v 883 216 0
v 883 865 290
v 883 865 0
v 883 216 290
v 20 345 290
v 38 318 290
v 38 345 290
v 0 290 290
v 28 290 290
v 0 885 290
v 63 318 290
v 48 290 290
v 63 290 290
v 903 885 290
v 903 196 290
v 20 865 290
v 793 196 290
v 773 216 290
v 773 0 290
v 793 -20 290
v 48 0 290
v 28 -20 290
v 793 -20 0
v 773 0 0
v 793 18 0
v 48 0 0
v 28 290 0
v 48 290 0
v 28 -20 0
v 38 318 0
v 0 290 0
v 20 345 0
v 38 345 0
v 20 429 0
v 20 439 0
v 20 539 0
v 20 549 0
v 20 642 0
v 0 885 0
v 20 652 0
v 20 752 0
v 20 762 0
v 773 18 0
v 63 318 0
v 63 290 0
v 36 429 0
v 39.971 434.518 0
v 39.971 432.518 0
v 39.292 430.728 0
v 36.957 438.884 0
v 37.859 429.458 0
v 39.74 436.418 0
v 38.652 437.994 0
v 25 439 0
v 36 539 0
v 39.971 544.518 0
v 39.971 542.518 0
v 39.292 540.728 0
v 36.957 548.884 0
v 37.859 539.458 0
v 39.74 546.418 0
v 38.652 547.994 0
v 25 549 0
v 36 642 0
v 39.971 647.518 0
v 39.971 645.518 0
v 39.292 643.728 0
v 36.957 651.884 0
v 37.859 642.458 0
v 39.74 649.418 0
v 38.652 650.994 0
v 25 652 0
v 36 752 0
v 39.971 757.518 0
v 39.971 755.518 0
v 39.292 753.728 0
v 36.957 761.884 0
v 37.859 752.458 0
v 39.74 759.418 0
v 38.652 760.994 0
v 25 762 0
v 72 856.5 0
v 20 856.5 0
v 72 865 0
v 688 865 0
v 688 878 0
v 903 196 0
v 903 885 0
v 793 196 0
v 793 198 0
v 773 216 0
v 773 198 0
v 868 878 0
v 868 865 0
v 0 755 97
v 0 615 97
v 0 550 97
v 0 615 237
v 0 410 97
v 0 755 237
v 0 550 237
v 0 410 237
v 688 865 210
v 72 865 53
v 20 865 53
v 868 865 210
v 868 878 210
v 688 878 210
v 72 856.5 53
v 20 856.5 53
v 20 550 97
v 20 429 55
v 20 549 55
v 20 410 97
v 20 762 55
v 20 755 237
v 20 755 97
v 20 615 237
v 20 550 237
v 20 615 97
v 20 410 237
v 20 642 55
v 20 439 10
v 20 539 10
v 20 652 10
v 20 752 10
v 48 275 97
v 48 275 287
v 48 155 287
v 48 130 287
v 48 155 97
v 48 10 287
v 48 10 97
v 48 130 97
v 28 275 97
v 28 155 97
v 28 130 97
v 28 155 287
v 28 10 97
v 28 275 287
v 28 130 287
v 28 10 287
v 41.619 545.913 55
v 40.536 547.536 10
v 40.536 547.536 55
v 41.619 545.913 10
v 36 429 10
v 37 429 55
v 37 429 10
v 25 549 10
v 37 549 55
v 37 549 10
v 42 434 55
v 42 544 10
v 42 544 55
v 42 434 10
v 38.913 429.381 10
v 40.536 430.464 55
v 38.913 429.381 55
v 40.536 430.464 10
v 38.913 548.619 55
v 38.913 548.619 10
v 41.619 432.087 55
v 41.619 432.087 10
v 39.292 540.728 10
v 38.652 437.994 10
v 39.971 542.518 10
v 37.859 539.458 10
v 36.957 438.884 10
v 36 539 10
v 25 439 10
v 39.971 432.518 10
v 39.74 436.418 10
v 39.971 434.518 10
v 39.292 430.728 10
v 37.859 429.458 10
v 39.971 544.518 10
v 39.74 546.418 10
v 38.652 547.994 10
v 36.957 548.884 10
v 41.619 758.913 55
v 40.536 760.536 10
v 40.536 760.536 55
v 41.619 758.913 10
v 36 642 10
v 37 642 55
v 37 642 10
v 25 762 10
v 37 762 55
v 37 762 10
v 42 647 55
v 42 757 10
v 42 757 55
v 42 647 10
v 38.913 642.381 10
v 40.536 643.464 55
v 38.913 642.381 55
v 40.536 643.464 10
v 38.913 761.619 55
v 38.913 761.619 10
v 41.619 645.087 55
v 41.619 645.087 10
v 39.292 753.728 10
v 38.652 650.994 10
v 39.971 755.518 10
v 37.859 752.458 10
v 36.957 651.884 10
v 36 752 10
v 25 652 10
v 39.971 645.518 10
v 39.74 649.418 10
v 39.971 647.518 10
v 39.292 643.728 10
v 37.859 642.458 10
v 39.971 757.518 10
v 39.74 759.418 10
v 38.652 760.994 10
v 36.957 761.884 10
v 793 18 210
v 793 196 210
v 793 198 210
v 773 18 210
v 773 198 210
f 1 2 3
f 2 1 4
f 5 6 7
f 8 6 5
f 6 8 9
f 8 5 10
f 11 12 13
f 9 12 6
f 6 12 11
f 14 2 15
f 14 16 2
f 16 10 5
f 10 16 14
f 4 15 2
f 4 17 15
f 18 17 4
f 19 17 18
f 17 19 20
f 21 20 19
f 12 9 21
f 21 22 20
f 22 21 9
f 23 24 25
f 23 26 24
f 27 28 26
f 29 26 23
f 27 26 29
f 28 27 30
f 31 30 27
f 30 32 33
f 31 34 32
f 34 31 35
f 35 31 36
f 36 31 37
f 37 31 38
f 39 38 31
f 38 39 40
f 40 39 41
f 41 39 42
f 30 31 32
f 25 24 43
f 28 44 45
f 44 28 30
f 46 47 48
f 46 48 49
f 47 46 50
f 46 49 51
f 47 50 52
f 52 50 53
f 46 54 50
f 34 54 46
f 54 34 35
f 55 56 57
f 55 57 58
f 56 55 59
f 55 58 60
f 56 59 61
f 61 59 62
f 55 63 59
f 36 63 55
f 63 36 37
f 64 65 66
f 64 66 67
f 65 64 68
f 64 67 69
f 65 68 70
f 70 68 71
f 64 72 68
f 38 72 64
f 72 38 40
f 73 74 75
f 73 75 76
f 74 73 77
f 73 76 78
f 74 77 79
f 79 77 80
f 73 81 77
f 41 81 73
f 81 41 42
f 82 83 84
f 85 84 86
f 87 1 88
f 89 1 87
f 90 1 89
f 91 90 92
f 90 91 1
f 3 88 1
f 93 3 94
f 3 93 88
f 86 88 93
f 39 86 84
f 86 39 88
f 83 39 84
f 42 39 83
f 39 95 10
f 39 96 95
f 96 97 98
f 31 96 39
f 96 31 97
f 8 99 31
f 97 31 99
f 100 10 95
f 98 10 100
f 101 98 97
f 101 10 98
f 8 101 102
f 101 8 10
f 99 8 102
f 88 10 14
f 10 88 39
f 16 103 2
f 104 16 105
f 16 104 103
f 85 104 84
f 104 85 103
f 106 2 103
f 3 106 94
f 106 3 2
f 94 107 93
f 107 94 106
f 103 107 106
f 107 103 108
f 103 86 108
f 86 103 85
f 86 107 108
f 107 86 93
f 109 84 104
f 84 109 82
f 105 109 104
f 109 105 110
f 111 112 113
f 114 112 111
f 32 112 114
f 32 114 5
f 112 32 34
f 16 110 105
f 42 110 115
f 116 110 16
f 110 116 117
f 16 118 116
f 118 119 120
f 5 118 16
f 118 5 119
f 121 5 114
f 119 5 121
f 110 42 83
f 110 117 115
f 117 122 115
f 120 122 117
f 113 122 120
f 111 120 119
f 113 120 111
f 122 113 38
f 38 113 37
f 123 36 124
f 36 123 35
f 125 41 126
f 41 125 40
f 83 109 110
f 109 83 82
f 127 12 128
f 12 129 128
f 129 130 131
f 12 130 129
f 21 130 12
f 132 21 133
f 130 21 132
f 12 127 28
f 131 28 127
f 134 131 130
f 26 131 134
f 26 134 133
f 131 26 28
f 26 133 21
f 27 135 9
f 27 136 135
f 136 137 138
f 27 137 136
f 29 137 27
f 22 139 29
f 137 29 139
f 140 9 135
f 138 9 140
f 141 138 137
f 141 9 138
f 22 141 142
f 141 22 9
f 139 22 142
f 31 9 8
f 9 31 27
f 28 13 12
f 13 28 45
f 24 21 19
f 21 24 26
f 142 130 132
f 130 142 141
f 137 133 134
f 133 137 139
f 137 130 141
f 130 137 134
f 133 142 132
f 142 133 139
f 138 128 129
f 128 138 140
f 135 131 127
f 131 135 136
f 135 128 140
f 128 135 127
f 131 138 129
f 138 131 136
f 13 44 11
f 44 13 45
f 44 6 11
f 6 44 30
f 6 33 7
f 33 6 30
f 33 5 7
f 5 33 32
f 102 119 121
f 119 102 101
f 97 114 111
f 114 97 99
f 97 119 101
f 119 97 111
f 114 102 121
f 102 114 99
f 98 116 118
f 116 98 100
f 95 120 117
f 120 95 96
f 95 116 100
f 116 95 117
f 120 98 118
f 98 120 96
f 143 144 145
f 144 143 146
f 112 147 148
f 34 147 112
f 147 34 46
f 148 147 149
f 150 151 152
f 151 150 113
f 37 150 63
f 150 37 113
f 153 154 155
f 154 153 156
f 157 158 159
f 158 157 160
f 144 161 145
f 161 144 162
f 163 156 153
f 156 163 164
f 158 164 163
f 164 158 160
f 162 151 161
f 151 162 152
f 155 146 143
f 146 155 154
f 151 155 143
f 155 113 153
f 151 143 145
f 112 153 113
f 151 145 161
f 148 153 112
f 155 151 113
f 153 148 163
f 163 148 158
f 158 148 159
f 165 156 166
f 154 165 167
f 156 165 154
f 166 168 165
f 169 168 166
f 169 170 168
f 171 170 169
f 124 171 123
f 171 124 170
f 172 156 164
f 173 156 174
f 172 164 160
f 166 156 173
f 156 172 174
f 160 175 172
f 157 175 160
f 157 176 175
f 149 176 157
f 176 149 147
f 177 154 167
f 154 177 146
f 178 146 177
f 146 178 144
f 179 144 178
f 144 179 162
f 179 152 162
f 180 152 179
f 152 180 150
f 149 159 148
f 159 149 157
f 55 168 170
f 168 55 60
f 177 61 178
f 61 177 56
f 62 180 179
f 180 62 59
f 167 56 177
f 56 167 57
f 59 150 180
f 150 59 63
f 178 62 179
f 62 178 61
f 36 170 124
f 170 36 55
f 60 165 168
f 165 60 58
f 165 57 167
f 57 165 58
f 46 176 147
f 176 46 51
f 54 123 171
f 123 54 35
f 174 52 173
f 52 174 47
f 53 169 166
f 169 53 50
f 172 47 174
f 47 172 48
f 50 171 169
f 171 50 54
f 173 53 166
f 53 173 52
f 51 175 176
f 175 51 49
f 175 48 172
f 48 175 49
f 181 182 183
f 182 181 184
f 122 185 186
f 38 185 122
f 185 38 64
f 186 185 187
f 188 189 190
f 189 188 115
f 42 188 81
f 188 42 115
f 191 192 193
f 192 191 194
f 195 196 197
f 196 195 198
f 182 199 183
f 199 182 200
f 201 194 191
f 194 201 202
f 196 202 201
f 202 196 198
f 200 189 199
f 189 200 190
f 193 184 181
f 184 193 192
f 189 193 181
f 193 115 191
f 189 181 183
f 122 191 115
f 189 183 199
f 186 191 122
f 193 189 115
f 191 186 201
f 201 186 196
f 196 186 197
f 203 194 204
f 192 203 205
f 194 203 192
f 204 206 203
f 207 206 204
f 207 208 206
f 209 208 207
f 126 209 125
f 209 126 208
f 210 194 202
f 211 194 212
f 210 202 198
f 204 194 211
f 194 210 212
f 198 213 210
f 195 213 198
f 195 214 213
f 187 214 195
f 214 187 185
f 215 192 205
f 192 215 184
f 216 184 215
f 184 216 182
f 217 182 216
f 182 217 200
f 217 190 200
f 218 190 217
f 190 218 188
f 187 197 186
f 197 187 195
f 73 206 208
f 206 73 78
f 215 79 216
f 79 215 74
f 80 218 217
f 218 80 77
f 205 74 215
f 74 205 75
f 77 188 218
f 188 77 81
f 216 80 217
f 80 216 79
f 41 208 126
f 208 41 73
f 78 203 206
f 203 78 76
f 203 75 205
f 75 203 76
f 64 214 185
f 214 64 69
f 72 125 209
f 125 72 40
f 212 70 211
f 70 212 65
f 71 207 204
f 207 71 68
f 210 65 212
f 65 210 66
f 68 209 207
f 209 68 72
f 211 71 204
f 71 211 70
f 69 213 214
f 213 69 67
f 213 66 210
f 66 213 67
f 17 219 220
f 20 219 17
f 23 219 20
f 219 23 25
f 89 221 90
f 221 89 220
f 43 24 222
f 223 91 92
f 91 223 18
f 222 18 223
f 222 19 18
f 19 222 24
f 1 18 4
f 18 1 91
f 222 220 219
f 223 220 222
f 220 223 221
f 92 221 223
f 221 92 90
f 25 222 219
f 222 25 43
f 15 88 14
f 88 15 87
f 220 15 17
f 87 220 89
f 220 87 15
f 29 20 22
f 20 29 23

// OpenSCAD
module tavolo_1(){
    union(){
        // pianale 140x80x3
        translate([0,0,69]) cube([140, 80, 3]);
        
        // gamba 1
        translate([11,11,0])
            rotate(a=90, v=[0,0,1]) 
                cylinder($fn=3, r=7, h=69);
        // gamba 2
        translate([129,11,0])
            rotate(a=90, v=[0,0,1]) 
                cylinder($fn=3, r=7, h=69);
        
        // gamba 3
        translate([11,69,0])
            rotate(a=-90, v=[0,0,1]) 
                cylinder($fn=3, r=7, h=69);
        // gamba 4
        translate([129,69,0])
            rotate(a=-90, v=[0,0,1]) 
                cylinder($fn=3, r=7, h=69);
    }
}

module tavolo_2(){
    
    module gamba_tavolo_2(){
        rotate(a=90, v=[0,0,1])
            union(){
                translate([1,0,0]) cube([78,8,3]);
                translate([35, 0, 0]) cube([8,8,74]);
            }
    }
    
    union(){
        // pianale 120x80x3
        translate([0,0,74]) cube([120, 80, 3]);
        
        // gamba 1
        translate([8,0,0]) gamba_tavolo_2();
        
        // gamba 2
        translate([120,0,0]) gamba_tavolo_2();
    
    }
}

module audio(){
    union(){
        translate([0,0,7]) cube([53,43,85]);
        
        translate([3.5,3.5,3.5]) sphere(r=3.5, $fn=50);
        translate([49.5,3.5,3.5]) sphere(r=3.5, $fn=50);
        translate([3.5,39.5,3.5]) sphere(r=3.5, $fn=50);
        translate([49.5,39.5,3.5]) sphere(r=3.5, $fn=50);
    }
}

module armadio(){
    module maniglia(){
        difference(){
            cube([2,5,10]);
            translate([0,2,2]) cube([3,3,6]);
        }
    }
    union(){
        cube([95,46,84]);
        translate([42,-5,68]) maniglia();
        translate([53,-5,68]) maniglia();
    }
}

module lucidi() {
    union(){
        translate([0,0,50]) cube([45,40,3]);
        cube([2,2,77]);
        translate([43,0,0]) cube([2,2,77]);
        translate([0,38,0]) cube([2,2,77]);
        translate([43,38,0]) cube([2,2,77]);
        translate([0,0,75]) cube([2,40,2]);
        translate([43,0,75]) cube([2,40,2]);
    }
}


module pareti() {
    
    module parete_sud(){
        // todo aggiungi termoconvettori
        module colonna(){
            union(){
                cube([63, 28,290]);
                cube([38, 28+27,290]);
            }
        }
        
        module termoconvettore(){
            module gamba() {
                hull(){
                    cube([10,5,10]);
                    translate([4,16,0]) cylinder(r=4,h=1);
                    translate([6,16,0]) cylinder(r=4,h=1);
                    translate([4,16,9]) cylinder(r=4,h=1);
                    translate([6,16,9]) cylinder(r=4,h=1);
                }
            }
            
            module corpo(){
                hull() {
                    cube([120, 10, 45]);
                    translate([5, 17, 0]) cylinder(r=5, h=1);
                    translate([5, 17, 44]) cylinder(r=5, h=1);
                    translate([115, 17, 44]) cylinder(r=5, h=1);
                    translate([115, 17, 0]) cylinder(r=5, h=1);
                }
            }
    
            translate([0,0, 10]) corpo();
            gamba();
            translate([110,0,0]) gamba();
        }
        
        translate([28,0,0])
            difference(){
                cube([20,290,290]);
                translate([0,10,97]) cube([20,120,190]);
                translate([0,155,97]) cube([20,120,190]);
            }
        
        translate([0,290,0]) colonna();
        
        translate([0,290+28+27,0])    
        difference(){
            cube([20,520,290]);
            translate([0,65,97]) cube([20,140,140]);
            translate([0,270,97]) cube([20,140,140]);
        }
        
        translate([20, 290+28+25+86+120,0]) 
            rotate(a=-90, v=[0,0,1])
                termoconvettore();
        
        translate([20, 290+28+25+86+240+93,0]) 
            rotate(a=-90, v=[0,0,1])
                termoconvettore();
    }


    module parete_ovest() {
        
        module angolo() {
            cube([52,8.5,53]);
        }
        
        difference(){
            cube([883,20,290]);
            translate([883-180-15,0,0]) cube([180,13,210]);
        }
        
        translate([20,-8.5,0]) 
            angolo();
        
    }

    module parete_nord() {
        
        union() {
            translate([110,216-20,0]) cube([20,670+19,290]);
            difference(){
                cube([20,216,290]);
                translate([0,18,0]) cube([20,180,210]);
            }
            translate([20,216-20,0]) cube([90,20,290]);
        }
        
    }

    module parete_est(){
        cube([244+486+35,20,290]);
    }
    
    translate([0,290+28+27+520,0]) parete_ovest();
    parete_sud();
    translate([486+244+43,0,0]) parete_nord();
    translate([28,-20,0]) parete_est();
}

pareti();
